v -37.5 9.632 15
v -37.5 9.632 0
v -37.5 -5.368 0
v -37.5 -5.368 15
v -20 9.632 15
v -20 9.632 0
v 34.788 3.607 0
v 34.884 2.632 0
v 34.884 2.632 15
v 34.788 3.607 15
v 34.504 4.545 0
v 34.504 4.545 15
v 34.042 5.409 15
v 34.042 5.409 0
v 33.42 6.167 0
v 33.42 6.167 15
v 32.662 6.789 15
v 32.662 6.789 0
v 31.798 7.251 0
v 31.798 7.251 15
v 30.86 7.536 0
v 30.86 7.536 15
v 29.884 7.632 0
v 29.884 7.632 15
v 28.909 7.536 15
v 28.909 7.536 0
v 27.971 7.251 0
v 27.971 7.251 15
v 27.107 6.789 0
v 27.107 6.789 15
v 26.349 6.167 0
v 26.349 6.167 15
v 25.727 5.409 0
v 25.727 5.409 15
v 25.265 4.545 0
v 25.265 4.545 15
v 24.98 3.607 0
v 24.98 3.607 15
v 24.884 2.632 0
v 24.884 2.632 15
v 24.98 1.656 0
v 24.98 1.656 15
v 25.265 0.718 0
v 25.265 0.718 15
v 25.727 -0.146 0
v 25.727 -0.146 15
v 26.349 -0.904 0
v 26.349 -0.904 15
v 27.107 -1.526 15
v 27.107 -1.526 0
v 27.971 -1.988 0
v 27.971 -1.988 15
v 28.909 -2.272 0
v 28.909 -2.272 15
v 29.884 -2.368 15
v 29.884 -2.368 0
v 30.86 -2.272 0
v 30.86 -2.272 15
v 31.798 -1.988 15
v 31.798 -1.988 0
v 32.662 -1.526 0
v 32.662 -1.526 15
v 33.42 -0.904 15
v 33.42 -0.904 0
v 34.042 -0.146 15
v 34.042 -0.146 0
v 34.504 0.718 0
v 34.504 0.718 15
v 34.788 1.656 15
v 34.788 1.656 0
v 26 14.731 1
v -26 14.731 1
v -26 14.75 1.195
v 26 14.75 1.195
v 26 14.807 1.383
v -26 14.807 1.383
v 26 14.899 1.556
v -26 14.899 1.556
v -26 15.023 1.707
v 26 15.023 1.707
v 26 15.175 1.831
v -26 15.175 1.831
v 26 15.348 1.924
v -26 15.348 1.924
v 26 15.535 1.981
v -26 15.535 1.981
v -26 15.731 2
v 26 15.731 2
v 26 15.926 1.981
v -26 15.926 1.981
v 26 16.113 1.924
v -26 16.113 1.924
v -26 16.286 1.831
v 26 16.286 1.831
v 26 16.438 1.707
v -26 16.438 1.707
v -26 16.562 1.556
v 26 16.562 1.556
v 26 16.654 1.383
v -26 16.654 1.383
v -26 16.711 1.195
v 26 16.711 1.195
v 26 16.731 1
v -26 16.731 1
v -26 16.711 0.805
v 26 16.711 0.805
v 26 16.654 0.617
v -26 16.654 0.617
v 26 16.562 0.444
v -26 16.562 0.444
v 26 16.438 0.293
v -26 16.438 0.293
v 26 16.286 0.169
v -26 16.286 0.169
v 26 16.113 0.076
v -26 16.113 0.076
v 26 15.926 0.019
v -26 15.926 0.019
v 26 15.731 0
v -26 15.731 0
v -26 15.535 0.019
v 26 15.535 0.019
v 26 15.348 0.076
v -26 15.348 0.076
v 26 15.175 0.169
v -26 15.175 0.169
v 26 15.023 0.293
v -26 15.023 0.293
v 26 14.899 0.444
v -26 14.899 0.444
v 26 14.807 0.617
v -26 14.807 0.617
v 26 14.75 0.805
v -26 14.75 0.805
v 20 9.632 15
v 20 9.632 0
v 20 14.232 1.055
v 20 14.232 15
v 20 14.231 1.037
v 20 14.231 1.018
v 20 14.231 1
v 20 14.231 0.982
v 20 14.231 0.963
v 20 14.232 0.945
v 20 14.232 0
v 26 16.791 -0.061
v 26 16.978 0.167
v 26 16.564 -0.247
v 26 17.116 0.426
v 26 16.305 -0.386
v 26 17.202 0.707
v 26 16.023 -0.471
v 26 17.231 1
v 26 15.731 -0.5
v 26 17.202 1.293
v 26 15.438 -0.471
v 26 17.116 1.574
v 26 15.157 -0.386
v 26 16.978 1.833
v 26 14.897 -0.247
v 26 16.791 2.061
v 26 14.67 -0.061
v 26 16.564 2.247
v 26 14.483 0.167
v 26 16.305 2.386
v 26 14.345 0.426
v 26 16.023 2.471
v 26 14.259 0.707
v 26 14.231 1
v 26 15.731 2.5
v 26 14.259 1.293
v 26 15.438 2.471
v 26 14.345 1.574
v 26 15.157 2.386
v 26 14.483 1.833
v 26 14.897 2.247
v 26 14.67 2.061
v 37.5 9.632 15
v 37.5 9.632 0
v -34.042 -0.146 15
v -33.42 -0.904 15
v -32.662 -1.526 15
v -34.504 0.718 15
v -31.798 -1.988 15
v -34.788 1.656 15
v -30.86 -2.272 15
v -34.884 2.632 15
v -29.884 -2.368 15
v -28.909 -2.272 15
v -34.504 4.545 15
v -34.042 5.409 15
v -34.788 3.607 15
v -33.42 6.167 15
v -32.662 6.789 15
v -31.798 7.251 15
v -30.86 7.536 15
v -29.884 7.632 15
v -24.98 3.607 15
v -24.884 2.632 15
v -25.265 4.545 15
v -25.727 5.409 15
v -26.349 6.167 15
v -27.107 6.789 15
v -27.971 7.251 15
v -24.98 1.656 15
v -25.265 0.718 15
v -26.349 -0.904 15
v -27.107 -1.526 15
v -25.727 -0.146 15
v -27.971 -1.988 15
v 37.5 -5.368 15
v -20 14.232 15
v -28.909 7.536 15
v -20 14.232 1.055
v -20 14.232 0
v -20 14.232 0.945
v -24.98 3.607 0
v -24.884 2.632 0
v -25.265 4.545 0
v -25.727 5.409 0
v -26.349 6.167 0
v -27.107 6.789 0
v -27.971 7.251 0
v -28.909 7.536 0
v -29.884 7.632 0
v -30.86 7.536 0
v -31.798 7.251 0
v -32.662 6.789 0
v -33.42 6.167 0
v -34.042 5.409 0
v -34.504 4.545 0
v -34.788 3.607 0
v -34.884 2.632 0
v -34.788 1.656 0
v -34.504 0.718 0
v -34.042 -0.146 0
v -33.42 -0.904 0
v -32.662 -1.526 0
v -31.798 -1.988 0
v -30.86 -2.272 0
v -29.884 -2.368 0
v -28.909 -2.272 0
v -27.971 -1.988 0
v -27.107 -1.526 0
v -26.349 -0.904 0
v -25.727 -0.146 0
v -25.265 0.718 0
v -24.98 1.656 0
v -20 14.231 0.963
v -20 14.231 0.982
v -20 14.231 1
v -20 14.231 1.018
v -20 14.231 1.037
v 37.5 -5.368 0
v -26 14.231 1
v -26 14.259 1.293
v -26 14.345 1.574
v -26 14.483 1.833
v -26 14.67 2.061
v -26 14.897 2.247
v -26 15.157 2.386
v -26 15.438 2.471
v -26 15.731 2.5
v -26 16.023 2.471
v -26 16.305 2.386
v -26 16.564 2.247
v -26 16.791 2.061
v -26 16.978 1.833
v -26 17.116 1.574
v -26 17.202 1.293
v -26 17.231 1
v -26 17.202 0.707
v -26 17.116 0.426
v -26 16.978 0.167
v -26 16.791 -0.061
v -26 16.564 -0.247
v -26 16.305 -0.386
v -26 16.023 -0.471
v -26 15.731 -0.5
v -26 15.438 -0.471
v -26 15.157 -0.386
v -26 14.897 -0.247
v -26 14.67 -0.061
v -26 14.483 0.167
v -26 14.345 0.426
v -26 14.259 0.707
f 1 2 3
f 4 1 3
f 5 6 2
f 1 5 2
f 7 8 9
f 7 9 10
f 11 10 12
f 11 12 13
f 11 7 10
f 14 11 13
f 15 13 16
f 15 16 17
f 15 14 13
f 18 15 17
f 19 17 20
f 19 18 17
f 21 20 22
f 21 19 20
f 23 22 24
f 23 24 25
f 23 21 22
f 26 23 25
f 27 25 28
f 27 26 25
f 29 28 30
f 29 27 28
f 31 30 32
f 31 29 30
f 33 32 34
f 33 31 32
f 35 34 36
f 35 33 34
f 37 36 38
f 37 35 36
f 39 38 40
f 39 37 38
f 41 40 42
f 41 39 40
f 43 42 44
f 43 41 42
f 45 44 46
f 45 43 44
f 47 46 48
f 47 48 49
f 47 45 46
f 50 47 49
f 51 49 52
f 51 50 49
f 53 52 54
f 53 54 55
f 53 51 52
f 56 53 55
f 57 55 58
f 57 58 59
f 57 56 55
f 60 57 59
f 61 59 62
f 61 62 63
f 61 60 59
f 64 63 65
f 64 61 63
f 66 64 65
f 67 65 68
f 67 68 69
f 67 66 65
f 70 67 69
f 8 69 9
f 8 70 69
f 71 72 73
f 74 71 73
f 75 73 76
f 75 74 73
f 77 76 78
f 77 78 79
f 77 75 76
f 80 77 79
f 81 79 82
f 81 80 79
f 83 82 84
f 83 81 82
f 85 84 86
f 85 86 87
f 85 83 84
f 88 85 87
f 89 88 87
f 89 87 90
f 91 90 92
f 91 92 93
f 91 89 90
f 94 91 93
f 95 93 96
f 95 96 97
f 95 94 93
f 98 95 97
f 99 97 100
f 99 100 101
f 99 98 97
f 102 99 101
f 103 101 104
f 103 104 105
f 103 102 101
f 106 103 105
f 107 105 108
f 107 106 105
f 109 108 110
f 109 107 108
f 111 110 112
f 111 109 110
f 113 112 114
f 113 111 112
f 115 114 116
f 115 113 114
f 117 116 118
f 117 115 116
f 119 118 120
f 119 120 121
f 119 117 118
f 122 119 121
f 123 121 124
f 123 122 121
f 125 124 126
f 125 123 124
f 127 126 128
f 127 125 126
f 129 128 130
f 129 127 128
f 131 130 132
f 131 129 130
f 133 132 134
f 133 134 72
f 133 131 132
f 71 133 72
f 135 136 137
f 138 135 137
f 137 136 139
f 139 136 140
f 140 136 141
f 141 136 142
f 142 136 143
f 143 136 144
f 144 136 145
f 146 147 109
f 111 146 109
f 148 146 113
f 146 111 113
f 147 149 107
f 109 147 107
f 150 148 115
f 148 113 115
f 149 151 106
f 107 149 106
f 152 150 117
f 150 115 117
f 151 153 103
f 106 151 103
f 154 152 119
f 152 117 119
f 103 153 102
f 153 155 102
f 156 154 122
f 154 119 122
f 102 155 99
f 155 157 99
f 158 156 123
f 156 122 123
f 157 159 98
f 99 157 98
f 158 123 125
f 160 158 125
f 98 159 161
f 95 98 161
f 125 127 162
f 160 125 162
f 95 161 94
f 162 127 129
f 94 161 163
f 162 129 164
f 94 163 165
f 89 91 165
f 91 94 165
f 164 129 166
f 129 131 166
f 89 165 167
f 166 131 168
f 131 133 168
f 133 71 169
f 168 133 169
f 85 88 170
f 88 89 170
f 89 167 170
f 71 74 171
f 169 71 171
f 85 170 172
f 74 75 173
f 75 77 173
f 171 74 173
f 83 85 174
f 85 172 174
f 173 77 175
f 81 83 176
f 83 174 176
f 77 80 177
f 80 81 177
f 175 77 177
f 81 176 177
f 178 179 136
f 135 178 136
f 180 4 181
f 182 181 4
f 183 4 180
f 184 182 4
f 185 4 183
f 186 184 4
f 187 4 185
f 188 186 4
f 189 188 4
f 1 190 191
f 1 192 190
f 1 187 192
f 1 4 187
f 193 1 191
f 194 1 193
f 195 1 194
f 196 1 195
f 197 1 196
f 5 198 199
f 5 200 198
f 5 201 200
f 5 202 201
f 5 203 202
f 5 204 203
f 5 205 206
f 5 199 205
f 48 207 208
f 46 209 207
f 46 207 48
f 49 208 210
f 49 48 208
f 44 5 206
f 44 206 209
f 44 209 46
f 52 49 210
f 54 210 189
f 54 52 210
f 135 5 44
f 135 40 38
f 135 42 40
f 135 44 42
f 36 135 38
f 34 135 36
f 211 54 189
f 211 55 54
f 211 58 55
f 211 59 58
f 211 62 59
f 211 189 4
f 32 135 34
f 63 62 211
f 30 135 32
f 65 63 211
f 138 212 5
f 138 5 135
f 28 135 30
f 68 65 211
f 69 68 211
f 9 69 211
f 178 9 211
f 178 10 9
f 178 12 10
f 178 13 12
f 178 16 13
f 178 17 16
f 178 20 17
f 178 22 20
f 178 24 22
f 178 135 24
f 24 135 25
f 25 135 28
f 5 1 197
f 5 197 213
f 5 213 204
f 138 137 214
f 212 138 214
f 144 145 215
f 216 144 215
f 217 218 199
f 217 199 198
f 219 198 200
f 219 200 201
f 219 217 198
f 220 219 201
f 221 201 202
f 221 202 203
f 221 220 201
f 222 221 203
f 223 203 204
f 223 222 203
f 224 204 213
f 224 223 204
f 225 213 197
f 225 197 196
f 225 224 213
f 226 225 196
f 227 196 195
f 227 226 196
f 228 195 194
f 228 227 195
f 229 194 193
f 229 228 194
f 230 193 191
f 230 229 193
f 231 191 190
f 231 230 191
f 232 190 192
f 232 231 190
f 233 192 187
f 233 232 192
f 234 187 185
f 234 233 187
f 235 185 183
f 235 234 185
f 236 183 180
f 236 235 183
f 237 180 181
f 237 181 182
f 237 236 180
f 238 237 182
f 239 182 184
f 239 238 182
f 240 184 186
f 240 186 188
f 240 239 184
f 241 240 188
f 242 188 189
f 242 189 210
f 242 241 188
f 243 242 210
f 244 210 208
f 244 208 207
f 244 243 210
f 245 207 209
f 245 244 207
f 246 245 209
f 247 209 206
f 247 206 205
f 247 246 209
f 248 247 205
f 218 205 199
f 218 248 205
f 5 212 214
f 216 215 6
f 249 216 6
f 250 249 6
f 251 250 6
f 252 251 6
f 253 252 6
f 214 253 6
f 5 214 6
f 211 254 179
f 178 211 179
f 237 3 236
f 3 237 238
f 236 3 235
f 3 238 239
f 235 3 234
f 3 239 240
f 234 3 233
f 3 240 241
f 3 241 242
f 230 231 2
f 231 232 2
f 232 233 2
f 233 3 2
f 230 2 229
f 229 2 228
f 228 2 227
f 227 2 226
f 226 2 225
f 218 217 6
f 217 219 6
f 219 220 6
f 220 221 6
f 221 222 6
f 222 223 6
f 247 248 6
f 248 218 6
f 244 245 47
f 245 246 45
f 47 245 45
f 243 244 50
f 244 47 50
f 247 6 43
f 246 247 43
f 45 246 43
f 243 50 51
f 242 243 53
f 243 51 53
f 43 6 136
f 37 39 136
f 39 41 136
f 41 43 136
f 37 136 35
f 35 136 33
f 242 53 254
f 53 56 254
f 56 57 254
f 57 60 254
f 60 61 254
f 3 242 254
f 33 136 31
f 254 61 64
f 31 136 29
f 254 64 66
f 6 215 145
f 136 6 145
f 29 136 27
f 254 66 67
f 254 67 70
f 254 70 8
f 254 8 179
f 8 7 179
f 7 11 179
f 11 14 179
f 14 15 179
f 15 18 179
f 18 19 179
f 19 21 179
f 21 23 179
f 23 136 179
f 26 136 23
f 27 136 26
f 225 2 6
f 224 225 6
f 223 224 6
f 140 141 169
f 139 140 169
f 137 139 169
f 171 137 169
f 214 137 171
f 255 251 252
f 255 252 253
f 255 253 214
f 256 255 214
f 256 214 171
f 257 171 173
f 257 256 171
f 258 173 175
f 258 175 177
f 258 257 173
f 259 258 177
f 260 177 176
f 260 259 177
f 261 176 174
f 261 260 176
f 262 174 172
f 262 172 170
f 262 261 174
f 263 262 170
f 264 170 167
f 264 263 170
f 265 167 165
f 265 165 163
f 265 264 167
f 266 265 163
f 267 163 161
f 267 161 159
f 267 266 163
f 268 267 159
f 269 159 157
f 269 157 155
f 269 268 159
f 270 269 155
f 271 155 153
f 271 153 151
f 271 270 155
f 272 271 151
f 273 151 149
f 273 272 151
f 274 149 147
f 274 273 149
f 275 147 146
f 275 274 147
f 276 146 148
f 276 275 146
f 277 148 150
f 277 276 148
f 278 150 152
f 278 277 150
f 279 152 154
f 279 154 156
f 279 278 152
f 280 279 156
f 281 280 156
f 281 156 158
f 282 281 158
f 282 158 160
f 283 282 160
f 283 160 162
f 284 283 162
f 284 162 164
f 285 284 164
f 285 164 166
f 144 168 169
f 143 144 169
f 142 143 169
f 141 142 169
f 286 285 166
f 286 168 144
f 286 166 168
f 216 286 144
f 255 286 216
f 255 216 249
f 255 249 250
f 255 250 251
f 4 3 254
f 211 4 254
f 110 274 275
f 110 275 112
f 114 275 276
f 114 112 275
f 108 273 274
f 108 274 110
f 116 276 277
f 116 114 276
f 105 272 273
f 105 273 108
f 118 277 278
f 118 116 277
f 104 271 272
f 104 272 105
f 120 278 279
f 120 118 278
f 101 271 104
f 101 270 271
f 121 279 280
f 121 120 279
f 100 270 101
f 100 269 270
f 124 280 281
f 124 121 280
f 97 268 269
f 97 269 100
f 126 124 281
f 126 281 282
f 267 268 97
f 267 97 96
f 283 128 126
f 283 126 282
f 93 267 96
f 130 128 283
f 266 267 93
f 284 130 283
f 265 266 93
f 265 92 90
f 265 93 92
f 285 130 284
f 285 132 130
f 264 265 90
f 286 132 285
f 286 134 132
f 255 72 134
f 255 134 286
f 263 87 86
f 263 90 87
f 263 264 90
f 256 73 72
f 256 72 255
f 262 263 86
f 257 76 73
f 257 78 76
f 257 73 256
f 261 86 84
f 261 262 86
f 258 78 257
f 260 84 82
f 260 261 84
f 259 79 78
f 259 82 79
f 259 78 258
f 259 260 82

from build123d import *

# Parameters (mm, degrees)
F0_R     = 5
F1_DEPTH = 15
F3_R     = 1.5
F3_R_2   = 1
F4_DEPTH = 26


# Not quite as in the source:
# - a feature names something its author has since deleted; it is built from what else it names


with BuildPart() as f1:
    # F0 (on Top) → F1 (new body)
    with BuildSketch(Plane.XY):
        Polygon((-37.5, 9.6315789474), (-37.5, -5.3684210526), (37.5, -5.3684210526), (37.5, 9.6315789474), (20, 9.6315789474), (20, 14.2315789474), (-20, 14.2315789474), (-20, 9.6315789474), align=None)
        with Locations((-29.8843569823, 2.6315789474)):
            Circle(F0_R, mode=Mode.SUBTRACT)
        with Locations((29.8843569823, 2.6315789474)):
            Circle(F0_R, mode=Mode.SUBTRACT)
    extrude(amount=F1_DEPTH)

    # F3 (on offset) → F4 (join, symmetric)
    with BuildSketch(Plane(origin=(0, 0, 0), x_dir=(0, -1, 0), z_dir=(-1, 0, 0))):
        with Locations((-15.7305789474, 1)):
            Circle(F3_R)
        with Locations((-15.7305789474, 1)):
            Circle(F3_R_2, mode=Mode.SUBTRACT)
    extrude(amount=F4_DEPTH, both=True)


solid = f1.part
